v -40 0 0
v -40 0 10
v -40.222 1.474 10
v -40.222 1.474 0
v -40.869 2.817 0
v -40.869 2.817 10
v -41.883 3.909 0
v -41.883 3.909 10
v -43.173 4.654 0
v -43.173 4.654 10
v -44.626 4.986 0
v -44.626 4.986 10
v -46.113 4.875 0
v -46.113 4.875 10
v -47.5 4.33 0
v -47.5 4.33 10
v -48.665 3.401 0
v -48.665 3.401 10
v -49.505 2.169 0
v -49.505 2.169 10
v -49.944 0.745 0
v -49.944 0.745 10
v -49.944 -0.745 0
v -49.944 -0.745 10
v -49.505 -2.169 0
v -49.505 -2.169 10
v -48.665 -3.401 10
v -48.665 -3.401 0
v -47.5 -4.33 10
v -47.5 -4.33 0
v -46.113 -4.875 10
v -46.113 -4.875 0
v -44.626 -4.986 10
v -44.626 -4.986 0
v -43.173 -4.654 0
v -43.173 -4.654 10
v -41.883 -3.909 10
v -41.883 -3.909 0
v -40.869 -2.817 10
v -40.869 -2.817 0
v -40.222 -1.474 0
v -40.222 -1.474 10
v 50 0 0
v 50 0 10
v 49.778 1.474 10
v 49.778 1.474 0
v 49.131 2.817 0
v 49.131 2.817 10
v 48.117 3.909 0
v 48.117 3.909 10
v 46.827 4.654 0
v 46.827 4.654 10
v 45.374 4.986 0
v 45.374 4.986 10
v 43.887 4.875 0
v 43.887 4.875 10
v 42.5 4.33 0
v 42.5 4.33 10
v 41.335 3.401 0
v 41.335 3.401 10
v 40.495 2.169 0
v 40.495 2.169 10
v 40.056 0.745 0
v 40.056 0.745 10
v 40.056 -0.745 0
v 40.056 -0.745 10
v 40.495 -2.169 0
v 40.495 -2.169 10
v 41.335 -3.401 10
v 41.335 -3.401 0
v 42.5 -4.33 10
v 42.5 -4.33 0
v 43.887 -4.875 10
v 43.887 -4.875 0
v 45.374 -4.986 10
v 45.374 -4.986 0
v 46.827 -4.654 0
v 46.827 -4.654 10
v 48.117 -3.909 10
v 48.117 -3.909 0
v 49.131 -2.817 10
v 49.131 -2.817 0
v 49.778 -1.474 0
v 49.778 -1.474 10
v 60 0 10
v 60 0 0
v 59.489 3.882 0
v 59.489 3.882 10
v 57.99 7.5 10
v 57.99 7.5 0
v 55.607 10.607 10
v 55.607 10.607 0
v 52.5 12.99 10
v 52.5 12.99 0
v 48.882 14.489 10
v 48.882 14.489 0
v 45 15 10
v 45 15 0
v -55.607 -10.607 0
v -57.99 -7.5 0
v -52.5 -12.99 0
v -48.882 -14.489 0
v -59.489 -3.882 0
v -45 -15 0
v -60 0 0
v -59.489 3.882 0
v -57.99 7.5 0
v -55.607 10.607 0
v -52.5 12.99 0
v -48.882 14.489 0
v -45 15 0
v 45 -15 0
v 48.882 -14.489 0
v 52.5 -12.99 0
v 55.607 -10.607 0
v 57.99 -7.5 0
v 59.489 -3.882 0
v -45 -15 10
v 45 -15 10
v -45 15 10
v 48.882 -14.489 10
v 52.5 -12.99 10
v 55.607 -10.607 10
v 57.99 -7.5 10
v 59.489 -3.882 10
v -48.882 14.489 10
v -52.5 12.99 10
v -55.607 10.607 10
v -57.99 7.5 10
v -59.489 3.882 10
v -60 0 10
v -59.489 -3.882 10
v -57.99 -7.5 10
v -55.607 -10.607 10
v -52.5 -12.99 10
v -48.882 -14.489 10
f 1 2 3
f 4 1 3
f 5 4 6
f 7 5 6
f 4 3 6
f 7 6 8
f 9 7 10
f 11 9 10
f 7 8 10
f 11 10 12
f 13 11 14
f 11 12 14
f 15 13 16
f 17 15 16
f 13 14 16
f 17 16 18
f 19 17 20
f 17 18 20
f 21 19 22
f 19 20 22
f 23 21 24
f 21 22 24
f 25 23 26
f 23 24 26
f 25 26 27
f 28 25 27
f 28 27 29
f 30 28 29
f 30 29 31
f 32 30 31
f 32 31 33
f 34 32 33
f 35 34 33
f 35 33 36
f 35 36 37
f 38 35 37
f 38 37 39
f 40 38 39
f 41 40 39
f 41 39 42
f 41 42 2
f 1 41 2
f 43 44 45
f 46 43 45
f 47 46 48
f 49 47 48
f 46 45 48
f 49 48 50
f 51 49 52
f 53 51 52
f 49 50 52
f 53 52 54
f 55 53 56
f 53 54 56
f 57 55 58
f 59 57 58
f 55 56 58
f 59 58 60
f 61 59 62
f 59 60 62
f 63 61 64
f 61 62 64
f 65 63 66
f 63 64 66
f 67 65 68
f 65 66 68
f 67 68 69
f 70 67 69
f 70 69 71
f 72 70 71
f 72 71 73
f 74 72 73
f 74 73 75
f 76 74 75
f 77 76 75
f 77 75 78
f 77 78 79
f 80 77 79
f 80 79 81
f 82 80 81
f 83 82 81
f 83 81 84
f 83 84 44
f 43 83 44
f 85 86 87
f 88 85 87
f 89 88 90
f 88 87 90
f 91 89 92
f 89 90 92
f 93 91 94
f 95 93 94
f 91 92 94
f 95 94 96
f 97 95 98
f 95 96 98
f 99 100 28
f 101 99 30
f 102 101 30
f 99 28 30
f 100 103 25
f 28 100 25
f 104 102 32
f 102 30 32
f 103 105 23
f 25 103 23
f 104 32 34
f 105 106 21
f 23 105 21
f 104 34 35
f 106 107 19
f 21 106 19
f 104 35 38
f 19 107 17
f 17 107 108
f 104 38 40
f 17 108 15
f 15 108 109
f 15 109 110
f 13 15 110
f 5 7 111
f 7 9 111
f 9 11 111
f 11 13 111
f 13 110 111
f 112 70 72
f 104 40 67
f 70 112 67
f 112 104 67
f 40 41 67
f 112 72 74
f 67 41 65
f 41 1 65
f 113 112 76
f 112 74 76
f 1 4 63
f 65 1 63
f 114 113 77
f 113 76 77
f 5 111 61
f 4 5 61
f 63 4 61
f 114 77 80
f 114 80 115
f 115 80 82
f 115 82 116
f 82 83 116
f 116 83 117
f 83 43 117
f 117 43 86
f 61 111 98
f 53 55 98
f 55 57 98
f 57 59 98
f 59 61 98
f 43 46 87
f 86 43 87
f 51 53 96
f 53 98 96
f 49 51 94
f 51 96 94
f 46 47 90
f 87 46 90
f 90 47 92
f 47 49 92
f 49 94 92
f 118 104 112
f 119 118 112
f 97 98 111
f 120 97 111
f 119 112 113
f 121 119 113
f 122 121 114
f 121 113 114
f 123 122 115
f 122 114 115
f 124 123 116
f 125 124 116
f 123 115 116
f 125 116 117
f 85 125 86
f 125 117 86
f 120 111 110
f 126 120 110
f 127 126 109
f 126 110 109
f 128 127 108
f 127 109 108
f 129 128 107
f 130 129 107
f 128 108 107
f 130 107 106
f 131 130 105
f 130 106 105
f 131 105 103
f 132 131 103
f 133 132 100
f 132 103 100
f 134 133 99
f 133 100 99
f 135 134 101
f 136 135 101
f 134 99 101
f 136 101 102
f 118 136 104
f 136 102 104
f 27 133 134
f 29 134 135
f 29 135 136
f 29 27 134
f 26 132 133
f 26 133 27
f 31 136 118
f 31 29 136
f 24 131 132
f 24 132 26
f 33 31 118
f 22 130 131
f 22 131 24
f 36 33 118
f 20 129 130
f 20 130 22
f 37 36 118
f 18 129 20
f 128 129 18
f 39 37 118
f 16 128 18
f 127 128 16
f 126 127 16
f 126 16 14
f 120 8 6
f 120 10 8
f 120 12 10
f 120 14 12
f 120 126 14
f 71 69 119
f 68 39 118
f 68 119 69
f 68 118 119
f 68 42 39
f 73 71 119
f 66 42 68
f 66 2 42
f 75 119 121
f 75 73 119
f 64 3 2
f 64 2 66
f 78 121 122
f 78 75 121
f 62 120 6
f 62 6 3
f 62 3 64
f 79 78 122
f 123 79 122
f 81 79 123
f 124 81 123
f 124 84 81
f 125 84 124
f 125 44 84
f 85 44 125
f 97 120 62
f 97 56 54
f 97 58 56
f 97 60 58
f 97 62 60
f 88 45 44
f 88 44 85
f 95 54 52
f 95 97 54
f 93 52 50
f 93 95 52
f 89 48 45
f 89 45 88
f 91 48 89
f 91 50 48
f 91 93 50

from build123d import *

# Parameters (mm, degrees)
F1_DEPTH = 10
F2_R     = 5
F3_DEPTH = 25


with BuildPart() as f1:
    # F0 (on Top) → F1 (new body)
    with BuildSketch(Plane.XY):
        with BuildLine():
            ThreePointArc((60, 0), (55.606602, 10.606602), (45, 15))
            Line((45, 15), (-45, 15))
            ThreePointArc((-45, 15), (-55.606602, 10.606602), (-60, 0))
            ThreePointArc((-60, 0), (-55.606602, -10.606602), (-45, -15))
            Line((-45, -15), (45, -15))
            ThreePointArc((45, -15), (55.606602, -10.606602), (60, 0))
        make_face()
    extrude(amount=F1_DEPTH)

    # F2 (on face) → F3 (cut)
    with BuildSketch(Plane.XY.offset(10)):
        with Locations((-45, 0)):
            Circle(F2_R)
        with Locations((45, 0)):
            Circle(F2_R)
    extrude(amount=-F3_DEPTH, mode=Mode.SUBTRACT)


solid = f1.part
